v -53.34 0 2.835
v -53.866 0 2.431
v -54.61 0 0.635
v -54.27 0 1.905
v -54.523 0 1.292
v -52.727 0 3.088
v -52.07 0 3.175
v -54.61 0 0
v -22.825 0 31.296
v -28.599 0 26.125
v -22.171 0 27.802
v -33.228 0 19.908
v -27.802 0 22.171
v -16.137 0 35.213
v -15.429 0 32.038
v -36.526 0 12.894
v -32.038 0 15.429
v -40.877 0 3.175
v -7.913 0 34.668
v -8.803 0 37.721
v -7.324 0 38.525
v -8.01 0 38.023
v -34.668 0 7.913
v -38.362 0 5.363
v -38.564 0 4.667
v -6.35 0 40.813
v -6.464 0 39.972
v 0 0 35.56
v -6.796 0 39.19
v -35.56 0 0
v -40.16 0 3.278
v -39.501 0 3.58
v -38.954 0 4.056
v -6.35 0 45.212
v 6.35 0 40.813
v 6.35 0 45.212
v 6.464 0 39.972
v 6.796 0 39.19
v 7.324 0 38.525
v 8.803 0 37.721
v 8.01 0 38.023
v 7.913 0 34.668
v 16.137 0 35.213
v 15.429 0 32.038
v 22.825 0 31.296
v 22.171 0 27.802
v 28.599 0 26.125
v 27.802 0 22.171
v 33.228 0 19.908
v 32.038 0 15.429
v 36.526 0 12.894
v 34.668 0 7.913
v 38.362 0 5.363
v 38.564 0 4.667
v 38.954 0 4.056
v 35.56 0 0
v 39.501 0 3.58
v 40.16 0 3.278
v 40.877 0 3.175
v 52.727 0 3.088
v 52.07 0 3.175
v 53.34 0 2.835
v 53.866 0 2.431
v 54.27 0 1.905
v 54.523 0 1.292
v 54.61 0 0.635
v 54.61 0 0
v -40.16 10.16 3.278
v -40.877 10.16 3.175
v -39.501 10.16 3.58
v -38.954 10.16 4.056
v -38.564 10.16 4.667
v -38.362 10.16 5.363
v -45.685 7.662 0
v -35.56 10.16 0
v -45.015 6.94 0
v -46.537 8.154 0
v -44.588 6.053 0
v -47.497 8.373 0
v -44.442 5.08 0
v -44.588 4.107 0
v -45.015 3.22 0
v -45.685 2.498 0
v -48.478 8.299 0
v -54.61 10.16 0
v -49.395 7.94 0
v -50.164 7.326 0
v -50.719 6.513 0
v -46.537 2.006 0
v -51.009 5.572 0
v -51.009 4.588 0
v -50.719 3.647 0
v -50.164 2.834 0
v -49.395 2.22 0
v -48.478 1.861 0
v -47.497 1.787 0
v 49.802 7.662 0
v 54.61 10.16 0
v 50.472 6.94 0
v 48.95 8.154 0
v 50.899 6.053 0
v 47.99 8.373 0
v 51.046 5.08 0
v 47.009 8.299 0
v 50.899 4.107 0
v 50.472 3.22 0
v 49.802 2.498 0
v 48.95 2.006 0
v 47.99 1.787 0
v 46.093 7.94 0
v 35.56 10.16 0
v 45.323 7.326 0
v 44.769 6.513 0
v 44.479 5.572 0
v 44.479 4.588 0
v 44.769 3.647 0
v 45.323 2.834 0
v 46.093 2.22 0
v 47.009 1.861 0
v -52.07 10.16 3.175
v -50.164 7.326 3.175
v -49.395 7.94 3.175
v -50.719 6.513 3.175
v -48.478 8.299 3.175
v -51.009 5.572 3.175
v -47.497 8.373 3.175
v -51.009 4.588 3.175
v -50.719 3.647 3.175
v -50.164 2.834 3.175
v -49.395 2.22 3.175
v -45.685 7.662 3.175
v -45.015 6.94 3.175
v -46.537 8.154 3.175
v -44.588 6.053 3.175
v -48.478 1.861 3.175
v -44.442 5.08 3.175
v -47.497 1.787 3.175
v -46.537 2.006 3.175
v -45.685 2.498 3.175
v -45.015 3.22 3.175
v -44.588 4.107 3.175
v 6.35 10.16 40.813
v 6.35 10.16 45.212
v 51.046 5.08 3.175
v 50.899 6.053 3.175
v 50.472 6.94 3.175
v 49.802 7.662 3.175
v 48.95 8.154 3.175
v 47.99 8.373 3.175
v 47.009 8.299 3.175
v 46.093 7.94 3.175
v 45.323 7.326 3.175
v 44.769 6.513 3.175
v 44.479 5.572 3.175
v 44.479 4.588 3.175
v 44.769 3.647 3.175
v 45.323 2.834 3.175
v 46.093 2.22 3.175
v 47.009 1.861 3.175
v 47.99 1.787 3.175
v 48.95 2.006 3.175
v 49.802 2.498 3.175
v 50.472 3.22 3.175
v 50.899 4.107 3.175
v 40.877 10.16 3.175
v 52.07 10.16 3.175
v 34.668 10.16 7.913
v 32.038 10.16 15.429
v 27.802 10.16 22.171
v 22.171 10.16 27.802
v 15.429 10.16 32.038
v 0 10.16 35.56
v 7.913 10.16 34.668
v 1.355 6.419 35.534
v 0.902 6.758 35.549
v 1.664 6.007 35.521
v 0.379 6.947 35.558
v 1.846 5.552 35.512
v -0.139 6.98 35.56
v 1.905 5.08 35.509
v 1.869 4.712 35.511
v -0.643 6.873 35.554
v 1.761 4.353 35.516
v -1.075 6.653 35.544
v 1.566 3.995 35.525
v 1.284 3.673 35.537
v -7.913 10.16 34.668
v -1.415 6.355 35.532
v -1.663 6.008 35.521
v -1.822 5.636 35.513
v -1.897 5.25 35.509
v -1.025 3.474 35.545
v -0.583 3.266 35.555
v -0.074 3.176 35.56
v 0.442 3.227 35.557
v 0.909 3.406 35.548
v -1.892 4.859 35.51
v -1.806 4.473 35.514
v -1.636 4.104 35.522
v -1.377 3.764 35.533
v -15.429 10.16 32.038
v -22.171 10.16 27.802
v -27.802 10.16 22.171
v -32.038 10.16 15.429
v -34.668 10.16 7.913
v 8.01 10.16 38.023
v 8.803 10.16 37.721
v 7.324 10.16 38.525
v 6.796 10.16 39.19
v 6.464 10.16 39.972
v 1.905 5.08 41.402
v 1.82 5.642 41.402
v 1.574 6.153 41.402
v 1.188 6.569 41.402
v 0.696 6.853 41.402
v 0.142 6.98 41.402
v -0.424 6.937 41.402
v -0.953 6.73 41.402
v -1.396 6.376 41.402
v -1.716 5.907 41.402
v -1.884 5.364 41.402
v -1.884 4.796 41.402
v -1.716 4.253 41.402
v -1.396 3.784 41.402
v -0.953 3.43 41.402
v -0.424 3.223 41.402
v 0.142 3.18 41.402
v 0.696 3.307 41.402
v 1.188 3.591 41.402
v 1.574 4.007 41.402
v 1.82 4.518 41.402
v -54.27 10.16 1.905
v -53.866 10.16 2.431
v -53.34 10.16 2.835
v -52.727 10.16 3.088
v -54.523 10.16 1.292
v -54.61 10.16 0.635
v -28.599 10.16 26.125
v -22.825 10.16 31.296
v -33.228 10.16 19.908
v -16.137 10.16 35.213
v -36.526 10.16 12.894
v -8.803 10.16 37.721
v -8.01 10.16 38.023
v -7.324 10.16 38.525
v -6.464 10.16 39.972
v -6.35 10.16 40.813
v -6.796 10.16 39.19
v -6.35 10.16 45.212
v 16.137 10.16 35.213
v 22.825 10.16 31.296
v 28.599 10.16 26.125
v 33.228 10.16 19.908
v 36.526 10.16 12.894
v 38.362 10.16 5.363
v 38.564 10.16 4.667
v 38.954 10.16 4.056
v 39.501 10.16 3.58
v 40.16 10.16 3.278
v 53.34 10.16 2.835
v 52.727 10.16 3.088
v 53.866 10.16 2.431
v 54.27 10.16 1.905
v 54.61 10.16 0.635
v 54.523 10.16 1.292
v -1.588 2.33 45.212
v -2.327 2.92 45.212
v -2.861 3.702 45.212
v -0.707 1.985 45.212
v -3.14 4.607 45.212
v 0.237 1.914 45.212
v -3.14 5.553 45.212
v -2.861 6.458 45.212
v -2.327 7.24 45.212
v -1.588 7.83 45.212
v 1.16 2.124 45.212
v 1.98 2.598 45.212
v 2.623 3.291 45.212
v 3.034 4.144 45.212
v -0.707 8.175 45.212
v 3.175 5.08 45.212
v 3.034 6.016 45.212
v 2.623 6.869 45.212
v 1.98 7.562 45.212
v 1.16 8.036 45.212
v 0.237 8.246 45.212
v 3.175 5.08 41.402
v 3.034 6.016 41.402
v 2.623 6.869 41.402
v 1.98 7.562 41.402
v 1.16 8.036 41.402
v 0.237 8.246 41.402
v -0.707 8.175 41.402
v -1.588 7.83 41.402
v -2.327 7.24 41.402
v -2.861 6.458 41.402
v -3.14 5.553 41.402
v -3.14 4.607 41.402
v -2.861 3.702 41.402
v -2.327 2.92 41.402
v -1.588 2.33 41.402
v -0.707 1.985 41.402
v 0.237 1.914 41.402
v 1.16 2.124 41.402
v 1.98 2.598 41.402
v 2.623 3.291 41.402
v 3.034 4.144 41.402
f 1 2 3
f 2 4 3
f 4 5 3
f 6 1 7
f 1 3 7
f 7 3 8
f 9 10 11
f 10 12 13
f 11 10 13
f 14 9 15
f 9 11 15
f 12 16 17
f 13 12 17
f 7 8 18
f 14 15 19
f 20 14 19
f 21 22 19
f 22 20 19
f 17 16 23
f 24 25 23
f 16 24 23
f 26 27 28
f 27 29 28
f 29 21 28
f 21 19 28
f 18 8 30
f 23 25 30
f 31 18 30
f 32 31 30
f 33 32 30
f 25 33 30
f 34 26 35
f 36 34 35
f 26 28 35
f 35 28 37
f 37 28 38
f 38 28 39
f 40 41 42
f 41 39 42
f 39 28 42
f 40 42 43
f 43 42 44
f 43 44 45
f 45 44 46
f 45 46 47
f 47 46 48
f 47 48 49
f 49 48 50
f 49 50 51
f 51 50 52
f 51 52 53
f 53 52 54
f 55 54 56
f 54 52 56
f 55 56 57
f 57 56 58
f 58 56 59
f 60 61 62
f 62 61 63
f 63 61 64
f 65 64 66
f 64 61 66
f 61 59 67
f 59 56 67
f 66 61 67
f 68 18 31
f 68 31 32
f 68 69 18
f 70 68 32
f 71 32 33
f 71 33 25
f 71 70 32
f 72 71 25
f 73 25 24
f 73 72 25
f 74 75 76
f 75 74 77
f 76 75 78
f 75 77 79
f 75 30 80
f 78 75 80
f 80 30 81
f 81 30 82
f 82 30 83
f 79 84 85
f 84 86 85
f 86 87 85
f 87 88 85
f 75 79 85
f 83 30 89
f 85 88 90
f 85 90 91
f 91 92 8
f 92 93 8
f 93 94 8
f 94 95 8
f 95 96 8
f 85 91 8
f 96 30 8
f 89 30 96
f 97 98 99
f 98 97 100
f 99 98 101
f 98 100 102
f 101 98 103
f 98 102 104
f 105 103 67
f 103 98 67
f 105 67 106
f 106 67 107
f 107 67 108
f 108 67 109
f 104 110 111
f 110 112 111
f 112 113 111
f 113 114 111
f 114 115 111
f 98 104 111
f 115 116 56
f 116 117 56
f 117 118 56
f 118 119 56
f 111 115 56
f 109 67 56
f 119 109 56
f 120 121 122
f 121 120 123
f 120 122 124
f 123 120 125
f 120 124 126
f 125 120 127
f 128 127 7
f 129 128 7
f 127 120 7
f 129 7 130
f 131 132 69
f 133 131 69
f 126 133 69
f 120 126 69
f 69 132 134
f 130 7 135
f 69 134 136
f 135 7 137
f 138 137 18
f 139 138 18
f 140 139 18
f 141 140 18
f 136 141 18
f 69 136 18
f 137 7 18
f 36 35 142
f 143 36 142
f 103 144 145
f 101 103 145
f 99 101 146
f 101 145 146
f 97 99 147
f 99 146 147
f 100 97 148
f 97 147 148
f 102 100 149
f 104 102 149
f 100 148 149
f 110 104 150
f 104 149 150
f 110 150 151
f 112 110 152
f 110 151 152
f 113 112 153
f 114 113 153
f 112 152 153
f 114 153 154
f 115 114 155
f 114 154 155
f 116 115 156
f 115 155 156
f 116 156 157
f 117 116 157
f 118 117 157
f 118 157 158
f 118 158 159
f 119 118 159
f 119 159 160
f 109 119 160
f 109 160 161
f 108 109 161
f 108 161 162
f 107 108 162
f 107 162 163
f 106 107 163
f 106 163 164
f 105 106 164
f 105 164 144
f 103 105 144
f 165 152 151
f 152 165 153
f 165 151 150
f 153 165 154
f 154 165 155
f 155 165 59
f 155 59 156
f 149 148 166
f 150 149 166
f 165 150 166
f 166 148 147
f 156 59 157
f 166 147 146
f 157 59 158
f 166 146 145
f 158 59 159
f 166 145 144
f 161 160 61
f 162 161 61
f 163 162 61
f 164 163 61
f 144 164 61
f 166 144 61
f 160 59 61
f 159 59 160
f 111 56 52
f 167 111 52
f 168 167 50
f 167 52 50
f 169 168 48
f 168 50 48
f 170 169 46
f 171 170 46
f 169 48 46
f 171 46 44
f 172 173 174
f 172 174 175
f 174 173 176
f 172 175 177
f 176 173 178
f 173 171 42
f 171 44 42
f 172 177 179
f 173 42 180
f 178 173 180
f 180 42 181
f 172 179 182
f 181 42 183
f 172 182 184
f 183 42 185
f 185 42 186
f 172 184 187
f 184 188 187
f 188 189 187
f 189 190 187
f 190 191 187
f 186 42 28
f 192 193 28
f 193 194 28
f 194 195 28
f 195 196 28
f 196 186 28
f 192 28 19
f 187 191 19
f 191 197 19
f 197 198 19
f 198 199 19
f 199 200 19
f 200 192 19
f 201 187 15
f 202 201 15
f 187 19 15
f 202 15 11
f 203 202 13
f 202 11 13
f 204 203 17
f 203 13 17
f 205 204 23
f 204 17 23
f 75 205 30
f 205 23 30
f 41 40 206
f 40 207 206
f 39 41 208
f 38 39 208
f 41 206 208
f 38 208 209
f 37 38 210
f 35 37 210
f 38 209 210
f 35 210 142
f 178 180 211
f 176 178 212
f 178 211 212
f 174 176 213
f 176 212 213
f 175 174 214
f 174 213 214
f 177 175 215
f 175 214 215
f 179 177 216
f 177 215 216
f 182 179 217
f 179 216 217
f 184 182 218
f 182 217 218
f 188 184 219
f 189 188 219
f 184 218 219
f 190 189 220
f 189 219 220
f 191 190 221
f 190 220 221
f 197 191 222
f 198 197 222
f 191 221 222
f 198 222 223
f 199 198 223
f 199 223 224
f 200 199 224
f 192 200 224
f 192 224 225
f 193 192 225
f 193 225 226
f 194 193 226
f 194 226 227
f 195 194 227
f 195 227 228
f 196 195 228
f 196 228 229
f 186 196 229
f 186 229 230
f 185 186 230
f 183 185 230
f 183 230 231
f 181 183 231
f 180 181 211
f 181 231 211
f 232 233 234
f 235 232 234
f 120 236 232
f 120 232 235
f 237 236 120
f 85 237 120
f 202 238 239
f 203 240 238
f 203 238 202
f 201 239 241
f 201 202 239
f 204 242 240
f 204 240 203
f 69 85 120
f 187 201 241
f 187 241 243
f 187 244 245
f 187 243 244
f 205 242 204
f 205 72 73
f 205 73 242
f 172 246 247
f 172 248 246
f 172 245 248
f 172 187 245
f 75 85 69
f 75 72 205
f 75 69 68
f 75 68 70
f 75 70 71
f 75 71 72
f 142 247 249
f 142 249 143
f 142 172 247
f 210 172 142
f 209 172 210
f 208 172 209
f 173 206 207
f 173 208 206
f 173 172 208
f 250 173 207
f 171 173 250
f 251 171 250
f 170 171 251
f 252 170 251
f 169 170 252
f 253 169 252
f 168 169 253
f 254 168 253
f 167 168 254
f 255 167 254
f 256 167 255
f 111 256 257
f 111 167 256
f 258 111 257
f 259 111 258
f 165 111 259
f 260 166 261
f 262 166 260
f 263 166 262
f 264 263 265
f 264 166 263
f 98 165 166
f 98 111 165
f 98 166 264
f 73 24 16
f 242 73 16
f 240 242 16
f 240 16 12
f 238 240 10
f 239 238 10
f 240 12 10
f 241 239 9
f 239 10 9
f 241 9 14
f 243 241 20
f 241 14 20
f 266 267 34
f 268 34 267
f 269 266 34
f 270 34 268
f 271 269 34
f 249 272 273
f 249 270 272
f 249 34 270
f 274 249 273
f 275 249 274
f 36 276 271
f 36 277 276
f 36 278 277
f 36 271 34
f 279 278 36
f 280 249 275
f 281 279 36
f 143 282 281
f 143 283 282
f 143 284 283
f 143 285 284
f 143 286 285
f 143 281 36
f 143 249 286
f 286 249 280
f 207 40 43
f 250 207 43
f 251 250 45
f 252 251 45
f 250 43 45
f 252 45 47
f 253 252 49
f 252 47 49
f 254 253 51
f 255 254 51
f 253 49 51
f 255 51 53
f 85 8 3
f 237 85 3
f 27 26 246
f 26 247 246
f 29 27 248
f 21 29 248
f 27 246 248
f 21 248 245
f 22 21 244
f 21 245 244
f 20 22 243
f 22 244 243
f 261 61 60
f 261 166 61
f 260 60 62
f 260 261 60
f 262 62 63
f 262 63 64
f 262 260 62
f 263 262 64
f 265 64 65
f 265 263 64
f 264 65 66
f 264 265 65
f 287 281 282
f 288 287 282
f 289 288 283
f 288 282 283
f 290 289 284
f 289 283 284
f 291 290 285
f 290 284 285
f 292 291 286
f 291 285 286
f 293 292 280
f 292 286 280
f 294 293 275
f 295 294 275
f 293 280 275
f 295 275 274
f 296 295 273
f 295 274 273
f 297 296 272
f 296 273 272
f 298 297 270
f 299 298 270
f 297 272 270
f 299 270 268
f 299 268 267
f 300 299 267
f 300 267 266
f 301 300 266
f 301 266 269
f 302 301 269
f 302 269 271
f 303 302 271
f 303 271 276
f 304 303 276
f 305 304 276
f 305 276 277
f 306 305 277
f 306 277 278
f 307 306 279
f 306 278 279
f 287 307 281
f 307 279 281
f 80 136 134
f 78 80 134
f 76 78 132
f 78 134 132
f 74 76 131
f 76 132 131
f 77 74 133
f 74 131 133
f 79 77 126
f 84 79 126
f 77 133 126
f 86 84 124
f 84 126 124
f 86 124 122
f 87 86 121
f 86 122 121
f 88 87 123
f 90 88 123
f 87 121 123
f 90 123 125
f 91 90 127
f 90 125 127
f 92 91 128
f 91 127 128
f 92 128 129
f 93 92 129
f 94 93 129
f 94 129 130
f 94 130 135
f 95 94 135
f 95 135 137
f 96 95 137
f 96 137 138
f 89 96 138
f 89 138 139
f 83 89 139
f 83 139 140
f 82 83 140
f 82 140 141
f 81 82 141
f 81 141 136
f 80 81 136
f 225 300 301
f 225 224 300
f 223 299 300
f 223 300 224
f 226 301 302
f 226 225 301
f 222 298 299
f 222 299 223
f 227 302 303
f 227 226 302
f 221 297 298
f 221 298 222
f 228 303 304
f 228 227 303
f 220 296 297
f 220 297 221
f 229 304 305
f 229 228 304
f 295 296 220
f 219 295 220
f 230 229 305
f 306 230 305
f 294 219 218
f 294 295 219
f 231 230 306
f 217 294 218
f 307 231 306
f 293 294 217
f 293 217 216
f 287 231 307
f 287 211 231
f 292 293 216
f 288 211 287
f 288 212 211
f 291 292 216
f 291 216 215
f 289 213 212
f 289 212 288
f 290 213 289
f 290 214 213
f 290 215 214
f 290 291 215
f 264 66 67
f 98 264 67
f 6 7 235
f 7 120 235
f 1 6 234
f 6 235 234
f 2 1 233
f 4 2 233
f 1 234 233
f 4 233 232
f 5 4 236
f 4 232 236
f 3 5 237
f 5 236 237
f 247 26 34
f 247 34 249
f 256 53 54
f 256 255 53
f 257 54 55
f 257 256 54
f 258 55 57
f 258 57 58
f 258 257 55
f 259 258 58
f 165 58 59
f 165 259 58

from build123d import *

# Parameters (mm, degrees)
BOSS_EXTRUDE1_DEPTH      = 10.16
FILLET1_R                = 2.54
SKETCH2_R                = 3.302
CUT_EXTRUDE1_DEPTH       = 10.16
FILLET3_R                = 2.54
BOSS_EXTRUDE2_REACH      = 69.719
BOSS_EXTRUDE2_END_RADIUS = 38.735
SKETCH4_W                = 12.7
SKETCH4_H                = 10.16
SKETCH4_2_W              = 12.7
SKETCH4_2_H              = 10.16
BOSS_EXTRUDE3_DEPTH      = 6.477
FILLET4_R                = 3.175
SKETCH5_R                = 3.175
CUT_EXTRUDE2_DEPTH       = 3.81
SKETCH7_R                = 1.905
CUT_EXTRUDE3_DEPTH       = 70.279169337


with BuildPart() as part:
    # Sketch1 → Boss-Extrude1 (new body)
    with BuildSketch(Plane(origin=(0, 0, 0), x_dir=(1, 0, 0), z_dir=(0, 1, 0))):
        with BuildLine():
            Line((-54.61, 0), (-54.61, -3.175))
            Line((-54.61, -3.175), (-38.60465775, -3.175))
            ThreePointArc((-38.60465775, -3.175), (0, -38.735), (38.60465775, -3.175))
            Line((38.60465775, -3.175), (54.61, -3.175))
            Line((54.61, -3.175), (54.61, 0))
            Line((54.61, 0), (35.56, 0))
            ThreePointArc((35.56, 0), (0, -35.56), (-35.56, 0))
            Line((-35.56, 0), (-54.61, 0))
        make_face()
    extrude(amount=BOSS_EXTRUDE1_DEPTH)

    # Fillet1
    fillet1_edges = [part.edges().sort_by_distance(p)[0] for p in [
        (38.60465775, 5.08, 3.175),
        (-38.60465775, 5.08, 3.175),
    ]]
    fillet(fillet1_edges, radius=FILLET1_R)

    # Sketch2 → Cut-Extrude1 (cut)
    with BuildSketch(Plane.XY.offset(3.175)):
        with Locations((-47.743715713, 5.08)):
            Circle(SKETCH2_R)
        with Locations((47.743715713, 5.08)):
            Circle(SKETCH2_R)
    extrude(amount=-CUT_EXTRUDE1_DEPTH, mode=Mode.SUBTRACT)

    # Fillet3
    fillet3_edges = [part.edges().sort_by_distance(p)[0] for p in [
        (-54.61, 5.08, 3.175),
        (54.61, 5.08, 3.175),
    ]]
    fillet(fillet3_edges, radius=FILLET3_R)

    # Boss-Extrude2: up to this cylinder (the profile starts outside it)
    boss_extrude2_end = Plane(origin=(0, 5.08, 0), z_dir=(0, -1, 0)) * Cylinder(BOSS_EXTRUDE2_END_RADIUS, 217.908, mode=Mode.PRIVATE)
    # Sketch4 → Boss-Extrude2 (add, up to the surface)
    with BuildSketch(Plane.XY.offset(38.735), mode=Mode.PRIVATE) as boss_extrude2_sk1:
        with Locations((0, 5.08)):
            Rectangle(SKETCH4_W, SKETCH4_H)
    boss_extrude2_tool1 = extrude(boss_extrude2_sk1.sketch, amount=-BOSS_EXTRUDE2_REACH, mode=Mode.PRIVATE) - boss_extrude2_end
    add(boss_extrude2_tool1.solids().sort_by_distance((0, 5.08, 38.735))[0])
    add(boss_extrude2_tool1.solids().sort_by_distance((0, 5.08, 38.735))[1])

    # Sketch4<2> → Boss-Extrude3 (add)
    with BuildSketch(Plane.XY.offset(38.735)):
        with Locations((0, 5.08)):
            Rectangle(SKETCH4_2_W, SKETCH4_2_H)
    extrude(amount=BOSS_EXTRUDE3_DEPTH)

    # Fillet4
    fillet4_edges = [part.edges().sort_by_distance(p)[0] for p in [
        (-6.35, 5.08, 38.210963414),
        (6.35, 5.08, 38.210963414),
    ]]
    fillet(fillet4_edges, radius=FILLET4_R)

    # Sketch5 → Cut-Extrude2 (cut)
    with BuildSketch(Plane.XY.offset(45.212)):
        with Locations((0, 5.08)):
            Circle(SKETCH5_R)
    extrude(amount=-CUT_EXTRUDE2_DEPTH, mode=Mode.SUBTRACT)

    # Sketch7 → Cut-Extrude3 (cut, through all)
    with BuildSketch(Plane.XY.offset(41.402)):
        with Locations((0, 5.08)):
            Circle(SKETCH7_R)
    extrude(amount=-CUT_EXTRUDE3_DEPTH, mode=Mode.SUBTRACT)


solid = part.part
